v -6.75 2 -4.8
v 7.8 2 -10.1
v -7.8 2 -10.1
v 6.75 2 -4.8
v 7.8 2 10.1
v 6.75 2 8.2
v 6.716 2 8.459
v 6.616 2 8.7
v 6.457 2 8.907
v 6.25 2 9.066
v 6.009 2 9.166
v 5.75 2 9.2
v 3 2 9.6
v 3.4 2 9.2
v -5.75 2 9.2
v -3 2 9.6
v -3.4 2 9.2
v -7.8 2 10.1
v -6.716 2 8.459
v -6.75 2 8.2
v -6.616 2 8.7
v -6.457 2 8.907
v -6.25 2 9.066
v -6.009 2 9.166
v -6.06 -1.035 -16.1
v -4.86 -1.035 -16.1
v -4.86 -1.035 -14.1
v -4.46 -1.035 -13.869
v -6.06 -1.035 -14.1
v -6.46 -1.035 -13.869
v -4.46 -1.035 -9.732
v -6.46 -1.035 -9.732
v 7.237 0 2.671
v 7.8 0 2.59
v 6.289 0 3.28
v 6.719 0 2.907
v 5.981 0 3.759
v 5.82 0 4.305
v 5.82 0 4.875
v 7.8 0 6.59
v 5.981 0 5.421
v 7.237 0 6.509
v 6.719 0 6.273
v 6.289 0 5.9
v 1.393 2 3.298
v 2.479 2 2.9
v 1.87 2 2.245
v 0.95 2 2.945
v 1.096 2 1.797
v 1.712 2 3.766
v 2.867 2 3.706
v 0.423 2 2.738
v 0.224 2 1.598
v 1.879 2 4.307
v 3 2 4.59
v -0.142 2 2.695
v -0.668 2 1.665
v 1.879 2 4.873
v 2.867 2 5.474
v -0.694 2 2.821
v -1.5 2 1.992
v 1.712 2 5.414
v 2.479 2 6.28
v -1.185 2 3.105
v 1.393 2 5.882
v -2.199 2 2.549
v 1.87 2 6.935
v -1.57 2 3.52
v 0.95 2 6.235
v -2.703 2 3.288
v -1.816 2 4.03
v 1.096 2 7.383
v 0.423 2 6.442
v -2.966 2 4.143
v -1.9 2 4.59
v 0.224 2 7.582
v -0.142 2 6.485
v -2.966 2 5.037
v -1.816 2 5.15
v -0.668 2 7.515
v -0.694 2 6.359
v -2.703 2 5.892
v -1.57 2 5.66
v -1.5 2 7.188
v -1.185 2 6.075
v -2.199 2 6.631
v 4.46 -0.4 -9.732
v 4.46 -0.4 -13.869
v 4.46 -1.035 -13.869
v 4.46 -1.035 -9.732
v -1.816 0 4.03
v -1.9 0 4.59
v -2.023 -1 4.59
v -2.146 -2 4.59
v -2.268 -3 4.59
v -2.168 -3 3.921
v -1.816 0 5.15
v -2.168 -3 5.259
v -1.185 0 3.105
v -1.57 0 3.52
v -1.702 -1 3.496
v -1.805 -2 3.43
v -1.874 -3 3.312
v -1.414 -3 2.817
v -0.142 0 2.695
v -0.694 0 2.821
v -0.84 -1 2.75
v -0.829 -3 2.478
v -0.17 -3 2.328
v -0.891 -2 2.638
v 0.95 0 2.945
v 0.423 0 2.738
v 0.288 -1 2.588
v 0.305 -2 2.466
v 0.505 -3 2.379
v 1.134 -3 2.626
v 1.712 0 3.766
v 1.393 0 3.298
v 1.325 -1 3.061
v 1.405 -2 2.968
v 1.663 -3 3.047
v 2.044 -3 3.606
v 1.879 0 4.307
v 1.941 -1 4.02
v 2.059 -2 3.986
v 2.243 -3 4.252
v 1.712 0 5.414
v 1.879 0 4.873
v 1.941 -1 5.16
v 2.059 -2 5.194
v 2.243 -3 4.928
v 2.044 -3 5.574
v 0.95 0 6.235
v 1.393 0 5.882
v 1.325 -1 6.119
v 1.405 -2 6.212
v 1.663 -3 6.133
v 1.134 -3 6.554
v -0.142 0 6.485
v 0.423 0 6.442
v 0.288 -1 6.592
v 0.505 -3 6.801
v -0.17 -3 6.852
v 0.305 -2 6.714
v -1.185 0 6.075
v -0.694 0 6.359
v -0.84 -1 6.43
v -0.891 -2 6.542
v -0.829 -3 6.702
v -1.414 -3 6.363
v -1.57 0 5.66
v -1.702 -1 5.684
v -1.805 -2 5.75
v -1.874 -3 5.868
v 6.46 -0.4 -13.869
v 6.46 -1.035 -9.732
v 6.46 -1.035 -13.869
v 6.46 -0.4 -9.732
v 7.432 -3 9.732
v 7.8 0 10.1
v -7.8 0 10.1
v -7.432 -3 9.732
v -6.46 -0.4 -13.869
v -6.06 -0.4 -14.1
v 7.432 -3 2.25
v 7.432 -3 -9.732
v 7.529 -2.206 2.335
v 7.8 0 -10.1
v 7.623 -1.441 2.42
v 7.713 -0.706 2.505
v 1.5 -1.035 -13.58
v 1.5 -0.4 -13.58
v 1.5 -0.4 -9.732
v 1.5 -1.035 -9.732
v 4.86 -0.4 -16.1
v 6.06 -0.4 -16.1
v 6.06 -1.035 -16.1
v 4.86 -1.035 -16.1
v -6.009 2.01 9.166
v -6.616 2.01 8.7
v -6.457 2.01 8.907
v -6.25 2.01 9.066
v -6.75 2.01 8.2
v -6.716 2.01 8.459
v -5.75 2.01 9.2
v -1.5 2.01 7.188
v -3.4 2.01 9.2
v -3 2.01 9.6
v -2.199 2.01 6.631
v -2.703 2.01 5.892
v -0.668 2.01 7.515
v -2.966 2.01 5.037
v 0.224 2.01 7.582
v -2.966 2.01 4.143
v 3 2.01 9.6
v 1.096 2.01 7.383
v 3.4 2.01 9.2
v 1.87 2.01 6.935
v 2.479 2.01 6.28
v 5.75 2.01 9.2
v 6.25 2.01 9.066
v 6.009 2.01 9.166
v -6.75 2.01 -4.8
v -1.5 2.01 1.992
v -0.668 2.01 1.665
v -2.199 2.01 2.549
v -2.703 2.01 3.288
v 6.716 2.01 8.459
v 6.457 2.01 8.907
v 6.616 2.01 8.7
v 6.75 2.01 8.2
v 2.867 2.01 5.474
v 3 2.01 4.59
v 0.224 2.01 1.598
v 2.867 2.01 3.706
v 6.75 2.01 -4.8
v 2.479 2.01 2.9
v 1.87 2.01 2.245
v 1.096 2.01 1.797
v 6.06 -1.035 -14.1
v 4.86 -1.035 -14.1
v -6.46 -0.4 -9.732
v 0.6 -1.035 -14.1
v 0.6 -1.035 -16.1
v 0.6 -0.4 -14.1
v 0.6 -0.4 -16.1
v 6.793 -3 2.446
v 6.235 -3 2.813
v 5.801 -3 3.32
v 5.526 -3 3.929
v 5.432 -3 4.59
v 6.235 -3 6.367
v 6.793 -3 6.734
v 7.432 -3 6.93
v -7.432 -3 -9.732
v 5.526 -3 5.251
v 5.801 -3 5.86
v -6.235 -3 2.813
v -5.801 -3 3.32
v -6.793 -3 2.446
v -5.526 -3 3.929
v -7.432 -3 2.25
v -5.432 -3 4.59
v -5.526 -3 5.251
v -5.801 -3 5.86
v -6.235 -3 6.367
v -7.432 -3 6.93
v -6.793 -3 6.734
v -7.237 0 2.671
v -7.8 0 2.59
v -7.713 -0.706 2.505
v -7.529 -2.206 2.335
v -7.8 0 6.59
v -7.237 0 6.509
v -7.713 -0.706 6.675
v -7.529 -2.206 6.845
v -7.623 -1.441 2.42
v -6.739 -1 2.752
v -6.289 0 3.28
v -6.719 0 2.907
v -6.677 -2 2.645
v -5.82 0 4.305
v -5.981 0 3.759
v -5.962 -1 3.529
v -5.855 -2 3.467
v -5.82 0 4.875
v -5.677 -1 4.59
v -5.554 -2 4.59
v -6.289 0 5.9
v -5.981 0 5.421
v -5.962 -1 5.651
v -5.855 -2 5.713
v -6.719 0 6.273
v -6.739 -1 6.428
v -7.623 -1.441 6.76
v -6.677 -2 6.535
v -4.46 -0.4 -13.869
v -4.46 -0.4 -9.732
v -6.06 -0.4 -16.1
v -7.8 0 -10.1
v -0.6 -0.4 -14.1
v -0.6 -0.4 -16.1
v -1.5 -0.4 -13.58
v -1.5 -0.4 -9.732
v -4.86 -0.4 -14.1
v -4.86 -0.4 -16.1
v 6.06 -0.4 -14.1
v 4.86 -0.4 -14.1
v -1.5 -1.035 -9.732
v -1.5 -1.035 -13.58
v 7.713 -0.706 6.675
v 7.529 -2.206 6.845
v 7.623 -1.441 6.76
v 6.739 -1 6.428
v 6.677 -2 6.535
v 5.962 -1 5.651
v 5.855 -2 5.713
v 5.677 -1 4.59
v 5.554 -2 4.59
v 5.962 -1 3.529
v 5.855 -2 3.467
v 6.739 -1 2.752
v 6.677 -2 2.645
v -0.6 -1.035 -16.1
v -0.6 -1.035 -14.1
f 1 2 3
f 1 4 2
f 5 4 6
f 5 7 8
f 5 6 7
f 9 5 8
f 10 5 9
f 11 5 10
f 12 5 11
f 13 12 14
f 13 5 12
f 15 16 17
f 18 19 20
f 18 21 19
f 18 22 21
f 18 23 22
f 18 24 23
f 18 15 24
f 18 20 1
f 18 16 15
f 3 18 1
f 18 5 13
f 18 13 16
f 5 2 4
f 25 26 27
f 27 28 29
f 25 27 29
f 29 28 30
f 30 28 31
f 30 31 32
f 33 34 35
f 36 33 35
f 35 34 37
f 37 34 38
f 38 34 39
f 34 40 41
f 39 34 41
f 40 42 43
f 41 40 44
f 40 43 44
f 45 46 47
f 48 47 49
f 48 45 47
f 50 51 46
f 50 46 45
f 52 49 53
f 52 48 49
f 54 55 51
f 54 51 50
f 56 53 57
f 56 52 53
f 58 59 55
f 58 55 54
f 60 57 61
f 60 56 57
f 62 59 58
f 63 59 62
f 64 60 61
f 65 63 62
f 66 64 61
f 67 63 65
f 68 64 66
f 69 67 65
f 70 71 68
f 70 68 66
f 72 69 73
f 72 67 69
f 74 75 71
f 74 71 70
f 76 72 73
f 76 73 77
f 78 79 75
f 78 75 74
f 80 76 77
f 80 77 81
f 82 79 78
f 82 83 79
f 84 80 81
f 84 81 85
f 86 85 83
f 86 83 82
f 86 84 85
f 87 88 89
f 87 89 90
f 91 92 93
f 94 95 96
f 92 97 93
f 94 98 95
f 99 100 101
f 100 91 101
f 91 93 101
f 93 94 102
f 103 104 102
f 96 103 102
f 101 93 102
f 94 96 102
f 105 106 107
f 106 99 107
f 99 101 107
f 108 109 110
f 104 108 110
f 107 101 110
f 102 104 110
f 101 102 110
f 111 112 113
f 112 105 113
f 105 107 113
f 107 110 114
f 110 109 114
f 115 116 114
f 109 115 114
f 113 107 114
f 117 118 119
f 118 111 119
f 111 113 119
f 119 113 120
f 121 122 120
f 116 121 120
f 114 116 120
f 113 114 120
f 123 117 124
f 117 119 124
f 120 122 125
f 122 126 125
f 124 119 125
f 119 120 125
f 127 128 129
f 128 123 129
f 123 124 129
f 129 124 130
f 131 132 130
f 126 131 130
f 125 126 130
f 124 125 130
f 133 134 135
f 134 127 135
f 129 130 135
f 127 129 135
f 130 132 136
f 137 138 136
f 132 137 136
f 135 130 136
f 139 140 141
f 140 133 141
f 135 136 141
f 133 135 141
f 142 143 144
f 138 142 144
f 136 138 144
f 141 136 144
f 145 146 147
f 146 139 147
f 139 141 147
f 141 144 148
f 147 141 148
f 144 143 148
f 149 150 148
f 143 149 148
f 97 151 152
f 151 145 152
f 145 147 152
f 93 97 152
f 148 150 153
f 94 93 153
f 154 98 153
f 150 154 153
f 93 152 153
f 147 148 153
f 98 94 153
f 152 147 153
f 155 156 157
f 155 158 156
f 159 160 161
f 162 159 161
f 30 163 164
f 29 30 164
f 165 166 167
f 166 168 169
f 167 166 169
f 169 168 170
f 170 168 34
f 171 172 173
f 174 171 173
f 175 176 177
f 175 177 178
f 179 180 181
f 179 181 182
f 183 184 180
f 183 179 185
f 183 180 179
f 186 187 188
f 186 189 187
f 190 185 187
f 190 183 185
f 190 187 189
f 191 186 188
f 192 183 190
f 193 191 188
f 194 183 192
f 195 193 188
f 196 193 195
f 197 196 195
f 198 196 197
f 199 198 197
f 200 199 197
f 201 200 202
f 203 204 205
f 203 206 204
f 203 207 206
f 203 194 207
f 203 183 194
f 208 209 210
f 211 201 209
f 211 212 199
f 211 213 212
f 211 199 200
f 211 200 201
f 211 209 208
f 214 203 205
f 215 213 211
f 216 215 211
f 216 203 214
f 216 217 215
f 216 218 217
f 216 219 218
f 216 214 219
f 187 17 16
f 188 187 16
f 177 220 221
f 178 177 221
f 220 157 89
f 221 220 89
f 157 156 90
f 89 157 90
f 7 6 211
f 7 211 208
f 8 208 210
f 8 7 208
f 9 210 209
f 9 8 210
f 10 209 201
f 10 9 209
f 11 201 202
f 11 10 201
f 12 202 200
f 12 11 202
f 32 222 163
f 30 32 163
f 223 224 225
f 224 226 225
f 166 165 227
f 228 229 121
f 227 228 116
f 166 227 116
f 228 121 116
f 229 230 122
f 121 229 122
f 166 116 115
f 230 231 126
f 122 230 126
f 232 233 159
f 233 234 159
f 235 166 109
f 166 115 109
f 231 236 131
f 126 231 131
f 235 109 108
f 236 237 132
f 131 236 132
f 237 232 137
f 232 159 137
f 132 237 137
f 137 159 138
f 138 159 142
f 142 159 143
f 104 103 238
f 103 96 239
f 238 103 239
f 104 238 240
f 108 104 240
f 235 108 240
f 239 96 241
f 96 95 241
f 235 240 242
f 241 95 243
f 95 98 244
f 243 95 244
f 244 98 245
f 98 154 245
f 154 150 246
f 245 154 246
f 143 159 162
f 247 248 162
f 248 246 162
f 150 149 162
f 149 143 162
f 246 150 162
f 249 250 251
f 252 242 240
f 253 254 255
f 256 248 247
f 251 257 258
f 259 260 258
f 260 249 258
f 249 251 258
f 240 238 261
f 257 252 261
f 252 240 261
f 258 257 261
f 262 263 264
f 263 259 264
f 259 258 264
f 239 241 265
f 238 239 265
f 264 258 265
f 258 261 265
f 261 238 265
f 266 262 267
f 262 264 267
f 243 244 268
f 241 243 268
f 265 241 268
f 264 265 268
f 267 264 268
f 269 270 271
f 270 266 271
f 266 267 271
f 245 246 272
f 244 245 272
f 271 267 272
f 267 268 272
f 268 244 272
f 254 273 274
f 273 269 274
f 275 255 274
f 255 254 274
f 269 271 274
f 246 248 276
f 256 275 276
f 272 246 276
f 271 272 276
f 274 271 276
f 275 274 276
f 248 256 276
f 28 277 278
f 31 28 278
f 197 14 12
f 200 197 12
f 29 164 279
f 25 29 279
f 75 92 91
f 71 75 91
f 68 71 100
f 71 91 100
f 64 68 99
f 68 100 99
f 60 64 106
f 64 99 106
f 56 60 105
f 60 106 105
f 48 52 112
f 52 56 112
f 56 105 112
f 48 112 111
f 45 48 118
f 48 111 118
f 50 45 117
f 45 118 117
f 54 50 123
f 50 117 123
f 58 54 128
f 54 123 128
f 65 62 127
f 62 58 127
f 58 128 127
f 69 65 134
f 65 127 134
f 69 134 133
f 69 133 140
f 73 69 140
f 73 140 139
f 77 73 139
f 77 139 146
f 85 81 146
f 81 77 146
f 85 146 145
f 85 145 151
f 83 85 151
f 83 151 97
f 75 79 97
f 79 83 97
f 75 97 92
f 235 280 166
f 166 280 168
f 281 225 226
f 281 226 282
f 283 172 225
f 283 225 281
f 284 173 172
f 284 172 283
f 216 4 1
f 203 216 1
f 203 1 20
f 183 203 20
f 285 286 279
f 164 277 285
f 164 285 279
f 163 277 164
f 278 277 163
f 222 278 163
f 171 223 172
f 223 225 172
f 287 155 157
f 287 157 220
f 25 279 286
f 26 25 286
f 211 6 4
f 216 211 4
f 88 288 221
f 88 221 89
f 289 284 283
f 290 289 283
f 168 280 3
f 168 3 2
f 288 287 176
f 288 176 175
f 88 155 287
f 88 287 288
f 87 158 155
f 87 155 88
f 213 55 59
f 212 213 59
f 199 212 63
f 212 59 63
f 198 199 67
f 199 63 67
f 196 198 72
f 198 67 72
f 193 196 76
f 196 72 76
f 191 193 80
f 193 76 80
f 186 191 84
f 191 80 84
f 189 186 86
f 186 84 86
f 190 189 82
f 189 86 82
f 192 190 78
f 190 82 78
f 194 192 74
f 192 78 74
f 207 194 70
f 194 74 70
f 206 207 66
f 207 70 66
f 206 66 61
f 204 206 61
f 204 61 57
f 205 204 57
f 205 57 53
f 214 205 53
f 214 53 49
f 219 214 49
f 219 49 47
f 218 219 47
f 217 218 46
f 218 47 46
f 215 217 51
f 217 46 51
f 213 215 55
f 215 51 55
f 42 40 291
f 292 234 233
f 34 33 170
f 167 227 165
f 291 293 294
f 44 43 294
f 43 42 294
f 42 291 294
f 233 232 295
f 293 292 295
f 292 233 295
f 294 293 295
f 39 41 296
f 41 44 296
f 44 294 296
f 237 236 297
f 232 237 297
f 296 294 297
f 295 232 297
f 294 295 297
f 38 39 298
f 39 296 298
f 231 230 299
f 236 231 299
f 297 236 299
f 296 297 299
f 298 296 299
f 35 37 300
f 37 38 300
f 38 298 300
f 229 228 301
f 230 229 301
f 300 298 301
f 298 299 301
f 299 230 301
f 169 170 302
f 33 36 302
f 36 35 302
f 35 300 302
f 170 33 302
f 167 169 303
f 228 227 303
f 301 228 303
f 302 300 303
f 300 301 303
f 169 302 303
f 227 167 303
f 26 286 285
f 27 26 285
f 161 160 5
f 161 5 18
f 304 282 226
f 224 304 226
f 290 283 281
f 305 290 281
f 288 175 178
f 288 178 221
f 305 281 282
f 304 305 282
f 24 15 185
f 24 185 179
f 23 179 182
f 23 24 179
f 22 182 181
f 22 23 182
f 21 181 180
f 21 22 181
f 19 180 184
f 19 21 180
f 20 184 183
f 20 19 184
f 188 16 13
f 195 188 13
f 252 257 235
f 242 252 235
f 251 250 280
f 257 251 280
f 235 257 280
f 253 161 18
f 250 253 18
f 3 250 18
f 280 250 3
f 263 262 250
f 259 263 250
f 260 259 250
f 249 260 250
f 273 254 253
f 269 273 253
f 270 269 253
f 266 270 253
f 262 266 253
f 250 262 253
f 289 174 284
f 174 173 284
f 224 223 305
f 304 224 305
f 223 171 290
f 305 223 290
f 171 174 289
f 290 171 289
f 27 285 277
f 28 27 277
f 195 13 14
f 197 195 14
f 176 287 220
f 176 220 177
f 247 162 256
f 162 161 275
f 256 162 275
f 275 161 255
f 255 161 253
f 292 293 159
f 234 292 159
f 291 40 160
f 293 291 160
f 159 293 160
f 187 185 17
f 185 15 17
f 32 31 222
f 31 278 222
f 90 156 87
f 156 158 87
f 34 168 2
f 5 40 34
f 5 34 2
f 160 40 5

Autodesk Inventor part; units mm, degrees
ref_plane "YZ Plane" through (0, 0, 0) normal (1, 0, 0) x (0, 1, 0)
ref_plane "XY Plane" through (0, 0, 0) normal (0, 0, 1) x (1, 0, 0)
sketch "Sketch1" plane through (0, 0, 0) normal (0, 1, 0) x (-1, 0, 0)
  line L0 (7.8, -10.1) -> (-7.8, -10.1)
  line L1 (-7.8, -10.1) -> (-7.8, 10.1)
  line L2 (-7.8, 10.1) -> (7.8, 10.1)
  line L3 (7.8, 10.1) -> (7.8, -10.1)
  line L4 (7.8, -10.1) -> (-7.8, 10.1) construction
  line L5 (-7.8, -10.1) -> (7.8, 10.1) construction
  circle A0 centre (0, 4.59) radius 1.9
  arc A1 (-7.8, 2.59) -> (-7.8, 6.59) centre (-7.8, 4.59) ccw
  arc A2 (7.8, 6.59) -> (7.8, 2.59) centre (7.8, 4.59) ccw
  point P0 (0, 0)
  point P1 (0, 10.1)
  dimension "d0" = 20.2
  dimension "d1" = 15.6
  dimension "d39" = 3.8
  dimension "d40" = 5.51
  dimension "d41" = 4
extrude "Extrusion6" add sketch "Sketch1" along normal blind 2
extrude "Extrusion7" add sketch "Sketch1" against normal blind 3 draft -7 contours L0 L1 A1 L2 L3 A2
ref_plane "Work Plane1" through (0, -0.4, 0) normal (0, 1, 0) x (-1, 0, 0)
sketch "Sketch4" plane through (0, -0.4, 0) normal (0, 1, 0) x (-1, 0, 0)
  line L0 (-7.8, -10.1) -> (7.8, -10.1) projected
  line L1 (-7.4316, -9.7316) -> (7.4316, -9.7316) projected
  line L2 (6.46, -9.7316) -> (6.46, -13.8691)
  line L3 (6.46, -13.8691) -> (6.06, -14.1)
  line L4 (6.06, -14.1) -> (6.06, -16.1)
  line L5 (4.86, -16.1) -> (4.86, -14.1)
  line L6 (4.86, -14.1) -> (4.46, -13.8691)
  line L7 (4.46, -13.8691) -> (4.46, -9.7316)
  line L8 (6.06, -16.1) -> (4.86, -16.1)
  line L9 (6.46, -9.7316) -> (4.46, -9.7316)
  line L10 (0, 0) -> (0, -9.7316) construction
  line L11 (-6.46, -9.7316) -> (-6.46, -13.8691)
  line L12 (-6.46, -13.8691) -> (-6.06, -14.1)
  line L13 (-6.06, -14.1) -> (-6.06, -16.1)
  line L14 (-4.86, -16.1) -> (-4.86, -14.1)
  line L15 (-4.86, -14.1) -> (-4.46, -13.8691)
  line L16 (-4.46, -13.8691) -> (-4.46, -9.7316)
  line L17 (-6.06, -16.1) -> (-4.86, -16.1)
  line L18 (-6.46, -9.7316) -> (-4.46, -9.7316)
  line L19 (1.5, -9.7316) -> (1.5, -13.5804)
  line L20 (1.5, -13.5804) -> (0.6, -14.1)
  line L21 (0.6, -14.1) -> (0.6, -16.1)
  line L22 (0.6, -16.1) -> (-0.6, -16.1)
  line L23 (-0.6, -16.1) -> (-0.6, -14.1)
  line L24 (-0.6, -14.1) -> (-1.5, -13.5804)
  line L25 (-1.5, -13.5804) -> (-1.5, -9.7316)
  line L26 (1.5, -9.7316) -> (-1.5, -9.7316)
  point P0 (5.46, -16.1)
  point P1 (-5.46, -16.1)
  dimension "d46" = 2
  dimension "d47" = 1.2
  dimension "d48" = 4
  dimension "d51" = 120
  dimension "d53" = 2
  dimension "d54" = 5.46
  dimension "d55" = 3
extrude "Extrusion4" add sketch "Sketch4" against normal blind 0.635 separate body contours L11 L1 L16 L0 | L0 L16 L15 L14 L17 L13 L12 L11 | L25 L1 L19 L0 | L0 L19 L20 L21 L22 L23 L24 L25 | L7 L1 L2 L0 | L0 L2 L3 L4 L8 L5 L6 L7
sketch "Sketch6" plane through (0, 2, 0) normal (0, 1, 0) x (1, 0, 0)
  circle A0 centre (0, -4.59) radius 1.9 projected
  line L0 (7.8, -10.1) -> (7.8, 10.1) projected
  line L1 (7.8, 10.1) -> (-7.8, 10.1) projected
  line L2 (-7.8, 10.1) -> (-7.8, -10.1) projected
  line L3 (-7.8, -10.1) -> (7.8, -10.1) projected
  line L4 (6.75, 4.8) -> (-6.75, 4.8)
  line L5 (-6.75, 4.8) -> (-6.75, -8.2)
  arc A1 (-6.75, -8.2) -> (-5.75, -9.2) centre (-5.75, -8.2) ccw
  line L6 (-5.75, -9.2) -> (-3.4, -9.2)
  line L7 (-3.4, -9.2) -> (-3, -9.6)
  line L8 (-3, -9.6) -> (3, -9.6)
  line L9 (3, -9.6) -> (3.4, -9.2)
  line L10 (3.4, -9.2) -> (5.75, -9.2)
  arc A2 (5.75, -9.2) -> (6.75, -8.2) centre (5.75, -8.2) ccw
  line L11 (6.75, -8.2) -> (6.75, 4.8)
  circle A3 centre (0, -4.59) radius 3
  point P0 (0, 0)
  point P1 (0, -9.6)
  point P2 (0, 4.8)
  dimension "d56" = 13.5
  dimension "d57" = 0.9
  dimension "d58" = 14
  dimension "d59" = 6
  dimension "d60" = 1
  dimension "d61" = 0.4
  dimension "d62" = 6
extrude "Extrusion8" add sketch "Sketch6" along normal blind 0.01 contours L11 A2 L10 L9 L8 L7 L6 A1 L5 L4 bodies 1
properties part number "Resistor_TH-TO220" material "ABS Plastic"
